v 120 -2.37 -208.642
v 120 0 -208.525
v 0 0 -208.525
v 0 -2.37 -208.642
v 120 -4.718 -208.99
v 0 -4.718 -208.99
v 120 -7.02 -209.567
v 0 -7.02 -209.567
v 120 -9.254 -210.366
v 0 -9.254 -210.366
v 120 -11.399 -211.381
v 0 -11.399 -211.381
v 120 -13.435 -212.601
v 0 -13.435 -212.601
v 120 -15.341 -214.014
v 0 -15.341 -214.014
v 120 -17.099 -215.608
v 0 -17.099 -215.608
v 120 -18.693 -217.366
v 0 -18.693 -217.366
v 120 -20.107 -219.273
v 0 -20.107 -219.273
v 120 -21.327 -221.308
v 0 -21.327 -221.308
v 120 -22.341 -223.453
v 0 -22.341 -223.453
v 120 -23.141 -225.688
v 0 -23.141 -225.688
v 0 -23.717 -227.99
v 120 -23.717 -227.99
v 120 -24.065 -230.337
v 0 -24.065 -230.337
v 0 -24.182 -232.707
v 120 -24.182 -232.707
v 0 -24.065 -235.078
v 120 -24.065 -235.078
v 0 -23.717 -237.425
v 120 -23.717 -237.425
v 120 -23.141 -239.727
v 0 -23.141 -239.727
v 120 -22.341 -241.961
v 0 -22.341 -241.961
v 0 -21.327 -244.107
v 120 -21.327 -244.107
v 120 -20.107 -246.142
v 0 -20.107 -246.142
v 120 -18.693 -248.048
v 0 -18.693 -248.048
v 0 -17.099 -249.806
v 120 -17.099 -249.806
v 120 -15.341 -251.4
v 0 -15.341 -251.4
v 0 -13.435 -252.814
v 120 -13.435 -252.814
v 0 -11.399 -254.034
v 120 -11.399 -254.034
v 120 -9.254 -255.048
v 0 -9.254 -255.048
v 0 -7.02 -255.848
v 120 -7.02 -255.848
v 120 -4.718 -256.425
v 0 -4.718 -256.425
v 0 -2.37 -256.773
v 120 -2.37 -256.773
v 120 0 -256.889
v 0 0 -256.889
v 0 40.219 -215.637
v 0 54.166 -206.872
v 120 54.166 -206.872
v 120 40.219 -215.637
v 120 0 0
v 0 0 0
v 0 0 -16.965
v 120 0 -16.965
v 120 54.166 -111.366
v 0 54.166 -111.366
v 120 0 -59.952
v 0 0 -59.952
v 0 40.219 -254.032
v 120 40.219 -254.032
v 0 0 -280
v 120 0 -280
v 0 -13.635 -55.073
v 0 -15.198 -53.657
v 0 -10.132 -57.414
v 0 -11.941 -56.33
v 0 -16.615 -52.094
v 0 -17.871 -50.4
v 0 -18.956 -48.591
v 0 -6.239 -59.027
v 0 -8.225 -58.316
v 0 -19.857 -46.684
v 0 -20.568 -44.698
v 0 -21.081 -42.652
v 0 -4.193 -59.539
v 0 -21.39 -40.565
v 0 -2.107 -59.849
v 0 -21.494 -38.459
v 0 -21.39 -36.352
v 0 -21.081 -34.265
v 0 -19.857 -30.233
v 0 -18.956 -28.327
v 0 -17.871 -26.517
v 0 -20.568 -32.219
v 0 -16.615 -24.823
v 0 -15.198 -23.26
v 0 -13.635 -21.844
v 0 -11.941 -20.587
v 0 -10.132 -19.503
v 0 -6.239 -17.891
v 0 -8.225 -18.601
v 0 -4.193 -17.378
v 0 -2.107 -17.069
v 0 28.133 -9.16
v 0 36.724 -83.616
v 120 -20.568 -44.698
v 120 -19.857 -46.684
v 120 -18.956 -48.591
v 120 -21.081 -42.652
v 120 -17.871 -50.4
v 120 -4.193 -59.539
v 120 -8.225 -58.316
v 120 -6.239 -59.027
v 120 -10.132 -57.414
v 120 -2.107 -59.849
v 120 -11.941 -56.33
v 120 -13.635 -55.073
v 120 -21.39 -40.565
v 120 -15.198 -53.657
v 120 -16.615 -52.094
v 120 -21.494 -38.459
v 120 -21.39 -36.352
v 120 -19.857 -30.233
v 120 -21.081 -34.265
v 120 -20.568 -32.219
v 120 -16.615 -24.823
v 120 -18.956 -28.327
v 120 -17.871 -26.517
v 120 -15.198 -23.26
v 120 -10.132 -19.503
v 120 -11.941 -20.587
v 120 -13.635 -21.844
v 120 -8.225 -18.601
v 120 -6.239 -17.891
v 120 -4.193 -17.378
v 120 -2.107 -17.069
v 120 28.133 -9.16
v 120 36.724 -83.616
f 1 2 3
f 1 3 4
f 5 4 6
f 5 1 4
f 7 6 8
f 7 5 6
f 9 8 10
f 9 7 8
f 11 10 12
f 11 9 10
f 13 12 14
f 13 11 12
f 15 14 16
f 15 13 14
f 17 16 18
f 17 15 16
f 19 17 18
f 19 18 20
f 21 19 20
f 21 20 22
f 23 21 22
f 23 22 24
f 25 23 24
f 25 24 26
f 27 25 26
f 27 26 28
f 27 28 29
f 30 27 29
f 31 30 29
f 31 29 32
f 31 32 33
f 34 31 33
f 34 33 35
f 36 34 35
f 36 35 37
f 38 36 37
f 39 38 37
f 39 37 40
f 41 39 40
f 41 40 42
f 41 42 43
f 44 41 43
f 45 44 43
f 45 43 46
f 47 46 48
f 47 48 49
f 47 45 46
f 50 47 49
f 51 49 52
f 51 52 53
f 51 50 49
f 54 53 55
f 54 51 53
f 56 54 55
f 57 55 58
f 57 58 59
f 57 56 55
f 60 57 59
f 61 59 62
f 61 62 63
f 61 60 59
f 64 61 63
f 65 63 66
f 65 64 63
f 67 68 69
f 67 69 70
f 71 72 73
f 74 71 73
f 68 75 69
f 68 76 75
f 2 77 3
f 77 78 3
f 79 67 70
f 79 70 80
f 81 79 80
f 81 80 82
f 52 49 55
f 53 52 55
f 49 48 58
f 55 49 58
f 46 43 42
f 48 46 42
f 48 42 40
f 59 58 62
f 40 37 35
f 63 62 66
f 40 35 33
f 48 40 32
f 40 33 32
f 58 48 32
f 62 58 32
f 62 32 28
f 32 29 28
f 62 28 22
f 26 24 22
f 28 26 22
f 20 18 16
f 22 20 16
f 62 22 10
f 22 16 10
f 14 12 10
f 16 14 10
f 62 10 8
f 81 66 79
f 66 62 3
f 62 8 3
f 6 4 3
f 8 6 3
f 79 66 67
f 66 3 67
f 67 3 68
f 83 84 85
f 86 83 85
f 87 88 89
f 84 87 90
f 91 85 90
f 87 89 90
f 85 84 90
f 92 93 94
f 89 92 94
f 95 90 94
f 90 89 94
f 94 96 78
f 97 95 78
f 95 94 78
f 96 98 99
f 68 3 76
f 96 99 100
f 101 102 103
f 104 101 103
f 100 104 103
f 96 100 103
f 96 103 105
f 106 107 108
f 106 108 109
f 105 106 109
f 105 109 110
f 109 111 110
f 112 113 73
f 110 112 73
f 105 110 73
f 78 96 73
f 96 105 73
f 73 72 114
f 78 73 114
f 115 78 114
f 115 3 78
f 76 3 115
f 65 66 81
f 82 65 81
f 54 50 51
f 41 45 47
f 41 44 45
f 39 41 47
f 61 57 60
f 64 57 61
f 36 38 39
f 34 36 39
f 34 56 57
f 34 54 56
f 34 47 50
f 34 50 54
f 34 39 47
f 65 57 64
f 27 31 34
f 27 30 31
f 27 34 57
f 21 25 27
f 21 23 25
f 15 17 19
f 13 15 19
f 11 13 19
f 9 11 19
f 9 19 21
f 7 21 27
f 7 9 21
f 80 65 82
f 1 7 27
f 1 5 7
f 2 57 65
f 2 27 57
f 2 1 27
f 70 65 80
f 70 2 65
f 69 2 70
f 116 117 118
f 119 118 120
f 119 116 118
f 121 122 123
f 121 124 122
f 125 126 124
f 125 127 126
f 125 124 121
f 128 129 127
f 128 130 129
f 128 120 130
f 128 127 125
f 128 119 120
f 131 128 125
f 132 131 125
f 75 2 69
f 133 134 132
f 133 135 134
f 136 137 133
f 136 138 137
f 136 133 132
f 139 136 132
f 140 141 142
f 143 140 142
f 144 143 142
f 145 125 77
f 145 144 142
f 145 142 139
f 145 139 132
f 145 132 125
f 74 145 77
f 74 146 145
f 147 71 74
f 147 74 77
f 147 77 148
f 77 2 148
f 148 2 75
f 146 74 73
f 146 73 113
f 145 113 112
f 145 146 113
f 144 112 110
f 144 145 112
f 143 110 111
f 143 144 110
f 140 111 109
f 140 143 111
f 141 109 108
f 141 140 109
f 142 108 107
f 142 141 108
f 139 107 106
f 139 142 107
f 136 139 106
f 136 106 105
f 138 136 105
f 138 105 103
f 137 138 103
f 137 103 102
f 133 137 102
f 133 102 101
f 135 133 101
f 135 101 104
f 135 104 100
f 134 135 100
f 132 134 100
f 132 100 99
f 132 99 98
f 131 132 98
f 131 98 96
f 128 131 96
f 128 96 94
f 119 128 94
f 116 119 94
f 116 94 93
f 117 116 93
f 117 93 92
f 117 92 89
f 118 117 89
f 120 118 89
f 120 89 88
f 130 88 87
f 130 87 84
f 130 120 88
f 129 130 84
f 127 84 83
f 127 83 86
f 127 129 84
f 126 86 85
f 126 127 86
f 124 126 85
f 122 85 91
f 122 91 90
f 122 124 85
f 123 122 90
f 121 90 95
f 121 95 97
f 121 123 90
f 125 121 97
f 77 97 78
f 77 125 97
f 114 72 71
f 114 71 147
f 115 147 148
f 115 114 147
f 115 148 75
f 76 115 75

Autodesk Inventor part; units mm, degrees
ref_plane "YZ Plane" through (0, 0, 0) normal (1, 0, 0) x (0, 1, 0)
ref_plane "XZ Plane" through (0, 0, 0) normal (0, 1, 0) x (-1, 0, 0)
ref_plane "XY Plane" through (0, 0, 0) normal (0, 0, 1) x (1, 0, 0)
sketch "Sketch1" plane through (0, 0, 0) normal (1, 0, 0) x (0, 1, 0)
  line L0 (0, 0) -> (0, -280)
  line L1 (0, 0) -> (28.1328, -9.1597)
  line L2 (28.1328, -9.1597) -> (36.7239, -83.6155)
  line L3 (36.7239, -83.6155) -> (54.1655, -111.3657)
  line L4 (54.1655, -111.3657) -> (54.1655, -206.8716)
  line L5 (54.1655, -206.8716) -> (40.2194, -215.637)
  line L6 (40.2194, -215.637) -> (40.2194, -254.0323)
  line L7 (40.2194, -254.0323) -> (0, -280)
  dimension "d0" = 280
  dimension "d2" = 0
extrude "Extrusion1" add sketch "Sketch1" along normal blind 120
sketch "Sketch2" plane through (120, 0, 0) normal (1, 0, 0) x (0, 0, -1)
  line L0 (0, 0) -> (280, 0) projected
  circle A0 centre (38.4586, 0) radius 21.4935
  circle A1 centre (232.7073, 0) radius 24.1819
extrude "Extrusion2" add sketch "Sketch2" against normal blind 120
properties part number "car110th"
